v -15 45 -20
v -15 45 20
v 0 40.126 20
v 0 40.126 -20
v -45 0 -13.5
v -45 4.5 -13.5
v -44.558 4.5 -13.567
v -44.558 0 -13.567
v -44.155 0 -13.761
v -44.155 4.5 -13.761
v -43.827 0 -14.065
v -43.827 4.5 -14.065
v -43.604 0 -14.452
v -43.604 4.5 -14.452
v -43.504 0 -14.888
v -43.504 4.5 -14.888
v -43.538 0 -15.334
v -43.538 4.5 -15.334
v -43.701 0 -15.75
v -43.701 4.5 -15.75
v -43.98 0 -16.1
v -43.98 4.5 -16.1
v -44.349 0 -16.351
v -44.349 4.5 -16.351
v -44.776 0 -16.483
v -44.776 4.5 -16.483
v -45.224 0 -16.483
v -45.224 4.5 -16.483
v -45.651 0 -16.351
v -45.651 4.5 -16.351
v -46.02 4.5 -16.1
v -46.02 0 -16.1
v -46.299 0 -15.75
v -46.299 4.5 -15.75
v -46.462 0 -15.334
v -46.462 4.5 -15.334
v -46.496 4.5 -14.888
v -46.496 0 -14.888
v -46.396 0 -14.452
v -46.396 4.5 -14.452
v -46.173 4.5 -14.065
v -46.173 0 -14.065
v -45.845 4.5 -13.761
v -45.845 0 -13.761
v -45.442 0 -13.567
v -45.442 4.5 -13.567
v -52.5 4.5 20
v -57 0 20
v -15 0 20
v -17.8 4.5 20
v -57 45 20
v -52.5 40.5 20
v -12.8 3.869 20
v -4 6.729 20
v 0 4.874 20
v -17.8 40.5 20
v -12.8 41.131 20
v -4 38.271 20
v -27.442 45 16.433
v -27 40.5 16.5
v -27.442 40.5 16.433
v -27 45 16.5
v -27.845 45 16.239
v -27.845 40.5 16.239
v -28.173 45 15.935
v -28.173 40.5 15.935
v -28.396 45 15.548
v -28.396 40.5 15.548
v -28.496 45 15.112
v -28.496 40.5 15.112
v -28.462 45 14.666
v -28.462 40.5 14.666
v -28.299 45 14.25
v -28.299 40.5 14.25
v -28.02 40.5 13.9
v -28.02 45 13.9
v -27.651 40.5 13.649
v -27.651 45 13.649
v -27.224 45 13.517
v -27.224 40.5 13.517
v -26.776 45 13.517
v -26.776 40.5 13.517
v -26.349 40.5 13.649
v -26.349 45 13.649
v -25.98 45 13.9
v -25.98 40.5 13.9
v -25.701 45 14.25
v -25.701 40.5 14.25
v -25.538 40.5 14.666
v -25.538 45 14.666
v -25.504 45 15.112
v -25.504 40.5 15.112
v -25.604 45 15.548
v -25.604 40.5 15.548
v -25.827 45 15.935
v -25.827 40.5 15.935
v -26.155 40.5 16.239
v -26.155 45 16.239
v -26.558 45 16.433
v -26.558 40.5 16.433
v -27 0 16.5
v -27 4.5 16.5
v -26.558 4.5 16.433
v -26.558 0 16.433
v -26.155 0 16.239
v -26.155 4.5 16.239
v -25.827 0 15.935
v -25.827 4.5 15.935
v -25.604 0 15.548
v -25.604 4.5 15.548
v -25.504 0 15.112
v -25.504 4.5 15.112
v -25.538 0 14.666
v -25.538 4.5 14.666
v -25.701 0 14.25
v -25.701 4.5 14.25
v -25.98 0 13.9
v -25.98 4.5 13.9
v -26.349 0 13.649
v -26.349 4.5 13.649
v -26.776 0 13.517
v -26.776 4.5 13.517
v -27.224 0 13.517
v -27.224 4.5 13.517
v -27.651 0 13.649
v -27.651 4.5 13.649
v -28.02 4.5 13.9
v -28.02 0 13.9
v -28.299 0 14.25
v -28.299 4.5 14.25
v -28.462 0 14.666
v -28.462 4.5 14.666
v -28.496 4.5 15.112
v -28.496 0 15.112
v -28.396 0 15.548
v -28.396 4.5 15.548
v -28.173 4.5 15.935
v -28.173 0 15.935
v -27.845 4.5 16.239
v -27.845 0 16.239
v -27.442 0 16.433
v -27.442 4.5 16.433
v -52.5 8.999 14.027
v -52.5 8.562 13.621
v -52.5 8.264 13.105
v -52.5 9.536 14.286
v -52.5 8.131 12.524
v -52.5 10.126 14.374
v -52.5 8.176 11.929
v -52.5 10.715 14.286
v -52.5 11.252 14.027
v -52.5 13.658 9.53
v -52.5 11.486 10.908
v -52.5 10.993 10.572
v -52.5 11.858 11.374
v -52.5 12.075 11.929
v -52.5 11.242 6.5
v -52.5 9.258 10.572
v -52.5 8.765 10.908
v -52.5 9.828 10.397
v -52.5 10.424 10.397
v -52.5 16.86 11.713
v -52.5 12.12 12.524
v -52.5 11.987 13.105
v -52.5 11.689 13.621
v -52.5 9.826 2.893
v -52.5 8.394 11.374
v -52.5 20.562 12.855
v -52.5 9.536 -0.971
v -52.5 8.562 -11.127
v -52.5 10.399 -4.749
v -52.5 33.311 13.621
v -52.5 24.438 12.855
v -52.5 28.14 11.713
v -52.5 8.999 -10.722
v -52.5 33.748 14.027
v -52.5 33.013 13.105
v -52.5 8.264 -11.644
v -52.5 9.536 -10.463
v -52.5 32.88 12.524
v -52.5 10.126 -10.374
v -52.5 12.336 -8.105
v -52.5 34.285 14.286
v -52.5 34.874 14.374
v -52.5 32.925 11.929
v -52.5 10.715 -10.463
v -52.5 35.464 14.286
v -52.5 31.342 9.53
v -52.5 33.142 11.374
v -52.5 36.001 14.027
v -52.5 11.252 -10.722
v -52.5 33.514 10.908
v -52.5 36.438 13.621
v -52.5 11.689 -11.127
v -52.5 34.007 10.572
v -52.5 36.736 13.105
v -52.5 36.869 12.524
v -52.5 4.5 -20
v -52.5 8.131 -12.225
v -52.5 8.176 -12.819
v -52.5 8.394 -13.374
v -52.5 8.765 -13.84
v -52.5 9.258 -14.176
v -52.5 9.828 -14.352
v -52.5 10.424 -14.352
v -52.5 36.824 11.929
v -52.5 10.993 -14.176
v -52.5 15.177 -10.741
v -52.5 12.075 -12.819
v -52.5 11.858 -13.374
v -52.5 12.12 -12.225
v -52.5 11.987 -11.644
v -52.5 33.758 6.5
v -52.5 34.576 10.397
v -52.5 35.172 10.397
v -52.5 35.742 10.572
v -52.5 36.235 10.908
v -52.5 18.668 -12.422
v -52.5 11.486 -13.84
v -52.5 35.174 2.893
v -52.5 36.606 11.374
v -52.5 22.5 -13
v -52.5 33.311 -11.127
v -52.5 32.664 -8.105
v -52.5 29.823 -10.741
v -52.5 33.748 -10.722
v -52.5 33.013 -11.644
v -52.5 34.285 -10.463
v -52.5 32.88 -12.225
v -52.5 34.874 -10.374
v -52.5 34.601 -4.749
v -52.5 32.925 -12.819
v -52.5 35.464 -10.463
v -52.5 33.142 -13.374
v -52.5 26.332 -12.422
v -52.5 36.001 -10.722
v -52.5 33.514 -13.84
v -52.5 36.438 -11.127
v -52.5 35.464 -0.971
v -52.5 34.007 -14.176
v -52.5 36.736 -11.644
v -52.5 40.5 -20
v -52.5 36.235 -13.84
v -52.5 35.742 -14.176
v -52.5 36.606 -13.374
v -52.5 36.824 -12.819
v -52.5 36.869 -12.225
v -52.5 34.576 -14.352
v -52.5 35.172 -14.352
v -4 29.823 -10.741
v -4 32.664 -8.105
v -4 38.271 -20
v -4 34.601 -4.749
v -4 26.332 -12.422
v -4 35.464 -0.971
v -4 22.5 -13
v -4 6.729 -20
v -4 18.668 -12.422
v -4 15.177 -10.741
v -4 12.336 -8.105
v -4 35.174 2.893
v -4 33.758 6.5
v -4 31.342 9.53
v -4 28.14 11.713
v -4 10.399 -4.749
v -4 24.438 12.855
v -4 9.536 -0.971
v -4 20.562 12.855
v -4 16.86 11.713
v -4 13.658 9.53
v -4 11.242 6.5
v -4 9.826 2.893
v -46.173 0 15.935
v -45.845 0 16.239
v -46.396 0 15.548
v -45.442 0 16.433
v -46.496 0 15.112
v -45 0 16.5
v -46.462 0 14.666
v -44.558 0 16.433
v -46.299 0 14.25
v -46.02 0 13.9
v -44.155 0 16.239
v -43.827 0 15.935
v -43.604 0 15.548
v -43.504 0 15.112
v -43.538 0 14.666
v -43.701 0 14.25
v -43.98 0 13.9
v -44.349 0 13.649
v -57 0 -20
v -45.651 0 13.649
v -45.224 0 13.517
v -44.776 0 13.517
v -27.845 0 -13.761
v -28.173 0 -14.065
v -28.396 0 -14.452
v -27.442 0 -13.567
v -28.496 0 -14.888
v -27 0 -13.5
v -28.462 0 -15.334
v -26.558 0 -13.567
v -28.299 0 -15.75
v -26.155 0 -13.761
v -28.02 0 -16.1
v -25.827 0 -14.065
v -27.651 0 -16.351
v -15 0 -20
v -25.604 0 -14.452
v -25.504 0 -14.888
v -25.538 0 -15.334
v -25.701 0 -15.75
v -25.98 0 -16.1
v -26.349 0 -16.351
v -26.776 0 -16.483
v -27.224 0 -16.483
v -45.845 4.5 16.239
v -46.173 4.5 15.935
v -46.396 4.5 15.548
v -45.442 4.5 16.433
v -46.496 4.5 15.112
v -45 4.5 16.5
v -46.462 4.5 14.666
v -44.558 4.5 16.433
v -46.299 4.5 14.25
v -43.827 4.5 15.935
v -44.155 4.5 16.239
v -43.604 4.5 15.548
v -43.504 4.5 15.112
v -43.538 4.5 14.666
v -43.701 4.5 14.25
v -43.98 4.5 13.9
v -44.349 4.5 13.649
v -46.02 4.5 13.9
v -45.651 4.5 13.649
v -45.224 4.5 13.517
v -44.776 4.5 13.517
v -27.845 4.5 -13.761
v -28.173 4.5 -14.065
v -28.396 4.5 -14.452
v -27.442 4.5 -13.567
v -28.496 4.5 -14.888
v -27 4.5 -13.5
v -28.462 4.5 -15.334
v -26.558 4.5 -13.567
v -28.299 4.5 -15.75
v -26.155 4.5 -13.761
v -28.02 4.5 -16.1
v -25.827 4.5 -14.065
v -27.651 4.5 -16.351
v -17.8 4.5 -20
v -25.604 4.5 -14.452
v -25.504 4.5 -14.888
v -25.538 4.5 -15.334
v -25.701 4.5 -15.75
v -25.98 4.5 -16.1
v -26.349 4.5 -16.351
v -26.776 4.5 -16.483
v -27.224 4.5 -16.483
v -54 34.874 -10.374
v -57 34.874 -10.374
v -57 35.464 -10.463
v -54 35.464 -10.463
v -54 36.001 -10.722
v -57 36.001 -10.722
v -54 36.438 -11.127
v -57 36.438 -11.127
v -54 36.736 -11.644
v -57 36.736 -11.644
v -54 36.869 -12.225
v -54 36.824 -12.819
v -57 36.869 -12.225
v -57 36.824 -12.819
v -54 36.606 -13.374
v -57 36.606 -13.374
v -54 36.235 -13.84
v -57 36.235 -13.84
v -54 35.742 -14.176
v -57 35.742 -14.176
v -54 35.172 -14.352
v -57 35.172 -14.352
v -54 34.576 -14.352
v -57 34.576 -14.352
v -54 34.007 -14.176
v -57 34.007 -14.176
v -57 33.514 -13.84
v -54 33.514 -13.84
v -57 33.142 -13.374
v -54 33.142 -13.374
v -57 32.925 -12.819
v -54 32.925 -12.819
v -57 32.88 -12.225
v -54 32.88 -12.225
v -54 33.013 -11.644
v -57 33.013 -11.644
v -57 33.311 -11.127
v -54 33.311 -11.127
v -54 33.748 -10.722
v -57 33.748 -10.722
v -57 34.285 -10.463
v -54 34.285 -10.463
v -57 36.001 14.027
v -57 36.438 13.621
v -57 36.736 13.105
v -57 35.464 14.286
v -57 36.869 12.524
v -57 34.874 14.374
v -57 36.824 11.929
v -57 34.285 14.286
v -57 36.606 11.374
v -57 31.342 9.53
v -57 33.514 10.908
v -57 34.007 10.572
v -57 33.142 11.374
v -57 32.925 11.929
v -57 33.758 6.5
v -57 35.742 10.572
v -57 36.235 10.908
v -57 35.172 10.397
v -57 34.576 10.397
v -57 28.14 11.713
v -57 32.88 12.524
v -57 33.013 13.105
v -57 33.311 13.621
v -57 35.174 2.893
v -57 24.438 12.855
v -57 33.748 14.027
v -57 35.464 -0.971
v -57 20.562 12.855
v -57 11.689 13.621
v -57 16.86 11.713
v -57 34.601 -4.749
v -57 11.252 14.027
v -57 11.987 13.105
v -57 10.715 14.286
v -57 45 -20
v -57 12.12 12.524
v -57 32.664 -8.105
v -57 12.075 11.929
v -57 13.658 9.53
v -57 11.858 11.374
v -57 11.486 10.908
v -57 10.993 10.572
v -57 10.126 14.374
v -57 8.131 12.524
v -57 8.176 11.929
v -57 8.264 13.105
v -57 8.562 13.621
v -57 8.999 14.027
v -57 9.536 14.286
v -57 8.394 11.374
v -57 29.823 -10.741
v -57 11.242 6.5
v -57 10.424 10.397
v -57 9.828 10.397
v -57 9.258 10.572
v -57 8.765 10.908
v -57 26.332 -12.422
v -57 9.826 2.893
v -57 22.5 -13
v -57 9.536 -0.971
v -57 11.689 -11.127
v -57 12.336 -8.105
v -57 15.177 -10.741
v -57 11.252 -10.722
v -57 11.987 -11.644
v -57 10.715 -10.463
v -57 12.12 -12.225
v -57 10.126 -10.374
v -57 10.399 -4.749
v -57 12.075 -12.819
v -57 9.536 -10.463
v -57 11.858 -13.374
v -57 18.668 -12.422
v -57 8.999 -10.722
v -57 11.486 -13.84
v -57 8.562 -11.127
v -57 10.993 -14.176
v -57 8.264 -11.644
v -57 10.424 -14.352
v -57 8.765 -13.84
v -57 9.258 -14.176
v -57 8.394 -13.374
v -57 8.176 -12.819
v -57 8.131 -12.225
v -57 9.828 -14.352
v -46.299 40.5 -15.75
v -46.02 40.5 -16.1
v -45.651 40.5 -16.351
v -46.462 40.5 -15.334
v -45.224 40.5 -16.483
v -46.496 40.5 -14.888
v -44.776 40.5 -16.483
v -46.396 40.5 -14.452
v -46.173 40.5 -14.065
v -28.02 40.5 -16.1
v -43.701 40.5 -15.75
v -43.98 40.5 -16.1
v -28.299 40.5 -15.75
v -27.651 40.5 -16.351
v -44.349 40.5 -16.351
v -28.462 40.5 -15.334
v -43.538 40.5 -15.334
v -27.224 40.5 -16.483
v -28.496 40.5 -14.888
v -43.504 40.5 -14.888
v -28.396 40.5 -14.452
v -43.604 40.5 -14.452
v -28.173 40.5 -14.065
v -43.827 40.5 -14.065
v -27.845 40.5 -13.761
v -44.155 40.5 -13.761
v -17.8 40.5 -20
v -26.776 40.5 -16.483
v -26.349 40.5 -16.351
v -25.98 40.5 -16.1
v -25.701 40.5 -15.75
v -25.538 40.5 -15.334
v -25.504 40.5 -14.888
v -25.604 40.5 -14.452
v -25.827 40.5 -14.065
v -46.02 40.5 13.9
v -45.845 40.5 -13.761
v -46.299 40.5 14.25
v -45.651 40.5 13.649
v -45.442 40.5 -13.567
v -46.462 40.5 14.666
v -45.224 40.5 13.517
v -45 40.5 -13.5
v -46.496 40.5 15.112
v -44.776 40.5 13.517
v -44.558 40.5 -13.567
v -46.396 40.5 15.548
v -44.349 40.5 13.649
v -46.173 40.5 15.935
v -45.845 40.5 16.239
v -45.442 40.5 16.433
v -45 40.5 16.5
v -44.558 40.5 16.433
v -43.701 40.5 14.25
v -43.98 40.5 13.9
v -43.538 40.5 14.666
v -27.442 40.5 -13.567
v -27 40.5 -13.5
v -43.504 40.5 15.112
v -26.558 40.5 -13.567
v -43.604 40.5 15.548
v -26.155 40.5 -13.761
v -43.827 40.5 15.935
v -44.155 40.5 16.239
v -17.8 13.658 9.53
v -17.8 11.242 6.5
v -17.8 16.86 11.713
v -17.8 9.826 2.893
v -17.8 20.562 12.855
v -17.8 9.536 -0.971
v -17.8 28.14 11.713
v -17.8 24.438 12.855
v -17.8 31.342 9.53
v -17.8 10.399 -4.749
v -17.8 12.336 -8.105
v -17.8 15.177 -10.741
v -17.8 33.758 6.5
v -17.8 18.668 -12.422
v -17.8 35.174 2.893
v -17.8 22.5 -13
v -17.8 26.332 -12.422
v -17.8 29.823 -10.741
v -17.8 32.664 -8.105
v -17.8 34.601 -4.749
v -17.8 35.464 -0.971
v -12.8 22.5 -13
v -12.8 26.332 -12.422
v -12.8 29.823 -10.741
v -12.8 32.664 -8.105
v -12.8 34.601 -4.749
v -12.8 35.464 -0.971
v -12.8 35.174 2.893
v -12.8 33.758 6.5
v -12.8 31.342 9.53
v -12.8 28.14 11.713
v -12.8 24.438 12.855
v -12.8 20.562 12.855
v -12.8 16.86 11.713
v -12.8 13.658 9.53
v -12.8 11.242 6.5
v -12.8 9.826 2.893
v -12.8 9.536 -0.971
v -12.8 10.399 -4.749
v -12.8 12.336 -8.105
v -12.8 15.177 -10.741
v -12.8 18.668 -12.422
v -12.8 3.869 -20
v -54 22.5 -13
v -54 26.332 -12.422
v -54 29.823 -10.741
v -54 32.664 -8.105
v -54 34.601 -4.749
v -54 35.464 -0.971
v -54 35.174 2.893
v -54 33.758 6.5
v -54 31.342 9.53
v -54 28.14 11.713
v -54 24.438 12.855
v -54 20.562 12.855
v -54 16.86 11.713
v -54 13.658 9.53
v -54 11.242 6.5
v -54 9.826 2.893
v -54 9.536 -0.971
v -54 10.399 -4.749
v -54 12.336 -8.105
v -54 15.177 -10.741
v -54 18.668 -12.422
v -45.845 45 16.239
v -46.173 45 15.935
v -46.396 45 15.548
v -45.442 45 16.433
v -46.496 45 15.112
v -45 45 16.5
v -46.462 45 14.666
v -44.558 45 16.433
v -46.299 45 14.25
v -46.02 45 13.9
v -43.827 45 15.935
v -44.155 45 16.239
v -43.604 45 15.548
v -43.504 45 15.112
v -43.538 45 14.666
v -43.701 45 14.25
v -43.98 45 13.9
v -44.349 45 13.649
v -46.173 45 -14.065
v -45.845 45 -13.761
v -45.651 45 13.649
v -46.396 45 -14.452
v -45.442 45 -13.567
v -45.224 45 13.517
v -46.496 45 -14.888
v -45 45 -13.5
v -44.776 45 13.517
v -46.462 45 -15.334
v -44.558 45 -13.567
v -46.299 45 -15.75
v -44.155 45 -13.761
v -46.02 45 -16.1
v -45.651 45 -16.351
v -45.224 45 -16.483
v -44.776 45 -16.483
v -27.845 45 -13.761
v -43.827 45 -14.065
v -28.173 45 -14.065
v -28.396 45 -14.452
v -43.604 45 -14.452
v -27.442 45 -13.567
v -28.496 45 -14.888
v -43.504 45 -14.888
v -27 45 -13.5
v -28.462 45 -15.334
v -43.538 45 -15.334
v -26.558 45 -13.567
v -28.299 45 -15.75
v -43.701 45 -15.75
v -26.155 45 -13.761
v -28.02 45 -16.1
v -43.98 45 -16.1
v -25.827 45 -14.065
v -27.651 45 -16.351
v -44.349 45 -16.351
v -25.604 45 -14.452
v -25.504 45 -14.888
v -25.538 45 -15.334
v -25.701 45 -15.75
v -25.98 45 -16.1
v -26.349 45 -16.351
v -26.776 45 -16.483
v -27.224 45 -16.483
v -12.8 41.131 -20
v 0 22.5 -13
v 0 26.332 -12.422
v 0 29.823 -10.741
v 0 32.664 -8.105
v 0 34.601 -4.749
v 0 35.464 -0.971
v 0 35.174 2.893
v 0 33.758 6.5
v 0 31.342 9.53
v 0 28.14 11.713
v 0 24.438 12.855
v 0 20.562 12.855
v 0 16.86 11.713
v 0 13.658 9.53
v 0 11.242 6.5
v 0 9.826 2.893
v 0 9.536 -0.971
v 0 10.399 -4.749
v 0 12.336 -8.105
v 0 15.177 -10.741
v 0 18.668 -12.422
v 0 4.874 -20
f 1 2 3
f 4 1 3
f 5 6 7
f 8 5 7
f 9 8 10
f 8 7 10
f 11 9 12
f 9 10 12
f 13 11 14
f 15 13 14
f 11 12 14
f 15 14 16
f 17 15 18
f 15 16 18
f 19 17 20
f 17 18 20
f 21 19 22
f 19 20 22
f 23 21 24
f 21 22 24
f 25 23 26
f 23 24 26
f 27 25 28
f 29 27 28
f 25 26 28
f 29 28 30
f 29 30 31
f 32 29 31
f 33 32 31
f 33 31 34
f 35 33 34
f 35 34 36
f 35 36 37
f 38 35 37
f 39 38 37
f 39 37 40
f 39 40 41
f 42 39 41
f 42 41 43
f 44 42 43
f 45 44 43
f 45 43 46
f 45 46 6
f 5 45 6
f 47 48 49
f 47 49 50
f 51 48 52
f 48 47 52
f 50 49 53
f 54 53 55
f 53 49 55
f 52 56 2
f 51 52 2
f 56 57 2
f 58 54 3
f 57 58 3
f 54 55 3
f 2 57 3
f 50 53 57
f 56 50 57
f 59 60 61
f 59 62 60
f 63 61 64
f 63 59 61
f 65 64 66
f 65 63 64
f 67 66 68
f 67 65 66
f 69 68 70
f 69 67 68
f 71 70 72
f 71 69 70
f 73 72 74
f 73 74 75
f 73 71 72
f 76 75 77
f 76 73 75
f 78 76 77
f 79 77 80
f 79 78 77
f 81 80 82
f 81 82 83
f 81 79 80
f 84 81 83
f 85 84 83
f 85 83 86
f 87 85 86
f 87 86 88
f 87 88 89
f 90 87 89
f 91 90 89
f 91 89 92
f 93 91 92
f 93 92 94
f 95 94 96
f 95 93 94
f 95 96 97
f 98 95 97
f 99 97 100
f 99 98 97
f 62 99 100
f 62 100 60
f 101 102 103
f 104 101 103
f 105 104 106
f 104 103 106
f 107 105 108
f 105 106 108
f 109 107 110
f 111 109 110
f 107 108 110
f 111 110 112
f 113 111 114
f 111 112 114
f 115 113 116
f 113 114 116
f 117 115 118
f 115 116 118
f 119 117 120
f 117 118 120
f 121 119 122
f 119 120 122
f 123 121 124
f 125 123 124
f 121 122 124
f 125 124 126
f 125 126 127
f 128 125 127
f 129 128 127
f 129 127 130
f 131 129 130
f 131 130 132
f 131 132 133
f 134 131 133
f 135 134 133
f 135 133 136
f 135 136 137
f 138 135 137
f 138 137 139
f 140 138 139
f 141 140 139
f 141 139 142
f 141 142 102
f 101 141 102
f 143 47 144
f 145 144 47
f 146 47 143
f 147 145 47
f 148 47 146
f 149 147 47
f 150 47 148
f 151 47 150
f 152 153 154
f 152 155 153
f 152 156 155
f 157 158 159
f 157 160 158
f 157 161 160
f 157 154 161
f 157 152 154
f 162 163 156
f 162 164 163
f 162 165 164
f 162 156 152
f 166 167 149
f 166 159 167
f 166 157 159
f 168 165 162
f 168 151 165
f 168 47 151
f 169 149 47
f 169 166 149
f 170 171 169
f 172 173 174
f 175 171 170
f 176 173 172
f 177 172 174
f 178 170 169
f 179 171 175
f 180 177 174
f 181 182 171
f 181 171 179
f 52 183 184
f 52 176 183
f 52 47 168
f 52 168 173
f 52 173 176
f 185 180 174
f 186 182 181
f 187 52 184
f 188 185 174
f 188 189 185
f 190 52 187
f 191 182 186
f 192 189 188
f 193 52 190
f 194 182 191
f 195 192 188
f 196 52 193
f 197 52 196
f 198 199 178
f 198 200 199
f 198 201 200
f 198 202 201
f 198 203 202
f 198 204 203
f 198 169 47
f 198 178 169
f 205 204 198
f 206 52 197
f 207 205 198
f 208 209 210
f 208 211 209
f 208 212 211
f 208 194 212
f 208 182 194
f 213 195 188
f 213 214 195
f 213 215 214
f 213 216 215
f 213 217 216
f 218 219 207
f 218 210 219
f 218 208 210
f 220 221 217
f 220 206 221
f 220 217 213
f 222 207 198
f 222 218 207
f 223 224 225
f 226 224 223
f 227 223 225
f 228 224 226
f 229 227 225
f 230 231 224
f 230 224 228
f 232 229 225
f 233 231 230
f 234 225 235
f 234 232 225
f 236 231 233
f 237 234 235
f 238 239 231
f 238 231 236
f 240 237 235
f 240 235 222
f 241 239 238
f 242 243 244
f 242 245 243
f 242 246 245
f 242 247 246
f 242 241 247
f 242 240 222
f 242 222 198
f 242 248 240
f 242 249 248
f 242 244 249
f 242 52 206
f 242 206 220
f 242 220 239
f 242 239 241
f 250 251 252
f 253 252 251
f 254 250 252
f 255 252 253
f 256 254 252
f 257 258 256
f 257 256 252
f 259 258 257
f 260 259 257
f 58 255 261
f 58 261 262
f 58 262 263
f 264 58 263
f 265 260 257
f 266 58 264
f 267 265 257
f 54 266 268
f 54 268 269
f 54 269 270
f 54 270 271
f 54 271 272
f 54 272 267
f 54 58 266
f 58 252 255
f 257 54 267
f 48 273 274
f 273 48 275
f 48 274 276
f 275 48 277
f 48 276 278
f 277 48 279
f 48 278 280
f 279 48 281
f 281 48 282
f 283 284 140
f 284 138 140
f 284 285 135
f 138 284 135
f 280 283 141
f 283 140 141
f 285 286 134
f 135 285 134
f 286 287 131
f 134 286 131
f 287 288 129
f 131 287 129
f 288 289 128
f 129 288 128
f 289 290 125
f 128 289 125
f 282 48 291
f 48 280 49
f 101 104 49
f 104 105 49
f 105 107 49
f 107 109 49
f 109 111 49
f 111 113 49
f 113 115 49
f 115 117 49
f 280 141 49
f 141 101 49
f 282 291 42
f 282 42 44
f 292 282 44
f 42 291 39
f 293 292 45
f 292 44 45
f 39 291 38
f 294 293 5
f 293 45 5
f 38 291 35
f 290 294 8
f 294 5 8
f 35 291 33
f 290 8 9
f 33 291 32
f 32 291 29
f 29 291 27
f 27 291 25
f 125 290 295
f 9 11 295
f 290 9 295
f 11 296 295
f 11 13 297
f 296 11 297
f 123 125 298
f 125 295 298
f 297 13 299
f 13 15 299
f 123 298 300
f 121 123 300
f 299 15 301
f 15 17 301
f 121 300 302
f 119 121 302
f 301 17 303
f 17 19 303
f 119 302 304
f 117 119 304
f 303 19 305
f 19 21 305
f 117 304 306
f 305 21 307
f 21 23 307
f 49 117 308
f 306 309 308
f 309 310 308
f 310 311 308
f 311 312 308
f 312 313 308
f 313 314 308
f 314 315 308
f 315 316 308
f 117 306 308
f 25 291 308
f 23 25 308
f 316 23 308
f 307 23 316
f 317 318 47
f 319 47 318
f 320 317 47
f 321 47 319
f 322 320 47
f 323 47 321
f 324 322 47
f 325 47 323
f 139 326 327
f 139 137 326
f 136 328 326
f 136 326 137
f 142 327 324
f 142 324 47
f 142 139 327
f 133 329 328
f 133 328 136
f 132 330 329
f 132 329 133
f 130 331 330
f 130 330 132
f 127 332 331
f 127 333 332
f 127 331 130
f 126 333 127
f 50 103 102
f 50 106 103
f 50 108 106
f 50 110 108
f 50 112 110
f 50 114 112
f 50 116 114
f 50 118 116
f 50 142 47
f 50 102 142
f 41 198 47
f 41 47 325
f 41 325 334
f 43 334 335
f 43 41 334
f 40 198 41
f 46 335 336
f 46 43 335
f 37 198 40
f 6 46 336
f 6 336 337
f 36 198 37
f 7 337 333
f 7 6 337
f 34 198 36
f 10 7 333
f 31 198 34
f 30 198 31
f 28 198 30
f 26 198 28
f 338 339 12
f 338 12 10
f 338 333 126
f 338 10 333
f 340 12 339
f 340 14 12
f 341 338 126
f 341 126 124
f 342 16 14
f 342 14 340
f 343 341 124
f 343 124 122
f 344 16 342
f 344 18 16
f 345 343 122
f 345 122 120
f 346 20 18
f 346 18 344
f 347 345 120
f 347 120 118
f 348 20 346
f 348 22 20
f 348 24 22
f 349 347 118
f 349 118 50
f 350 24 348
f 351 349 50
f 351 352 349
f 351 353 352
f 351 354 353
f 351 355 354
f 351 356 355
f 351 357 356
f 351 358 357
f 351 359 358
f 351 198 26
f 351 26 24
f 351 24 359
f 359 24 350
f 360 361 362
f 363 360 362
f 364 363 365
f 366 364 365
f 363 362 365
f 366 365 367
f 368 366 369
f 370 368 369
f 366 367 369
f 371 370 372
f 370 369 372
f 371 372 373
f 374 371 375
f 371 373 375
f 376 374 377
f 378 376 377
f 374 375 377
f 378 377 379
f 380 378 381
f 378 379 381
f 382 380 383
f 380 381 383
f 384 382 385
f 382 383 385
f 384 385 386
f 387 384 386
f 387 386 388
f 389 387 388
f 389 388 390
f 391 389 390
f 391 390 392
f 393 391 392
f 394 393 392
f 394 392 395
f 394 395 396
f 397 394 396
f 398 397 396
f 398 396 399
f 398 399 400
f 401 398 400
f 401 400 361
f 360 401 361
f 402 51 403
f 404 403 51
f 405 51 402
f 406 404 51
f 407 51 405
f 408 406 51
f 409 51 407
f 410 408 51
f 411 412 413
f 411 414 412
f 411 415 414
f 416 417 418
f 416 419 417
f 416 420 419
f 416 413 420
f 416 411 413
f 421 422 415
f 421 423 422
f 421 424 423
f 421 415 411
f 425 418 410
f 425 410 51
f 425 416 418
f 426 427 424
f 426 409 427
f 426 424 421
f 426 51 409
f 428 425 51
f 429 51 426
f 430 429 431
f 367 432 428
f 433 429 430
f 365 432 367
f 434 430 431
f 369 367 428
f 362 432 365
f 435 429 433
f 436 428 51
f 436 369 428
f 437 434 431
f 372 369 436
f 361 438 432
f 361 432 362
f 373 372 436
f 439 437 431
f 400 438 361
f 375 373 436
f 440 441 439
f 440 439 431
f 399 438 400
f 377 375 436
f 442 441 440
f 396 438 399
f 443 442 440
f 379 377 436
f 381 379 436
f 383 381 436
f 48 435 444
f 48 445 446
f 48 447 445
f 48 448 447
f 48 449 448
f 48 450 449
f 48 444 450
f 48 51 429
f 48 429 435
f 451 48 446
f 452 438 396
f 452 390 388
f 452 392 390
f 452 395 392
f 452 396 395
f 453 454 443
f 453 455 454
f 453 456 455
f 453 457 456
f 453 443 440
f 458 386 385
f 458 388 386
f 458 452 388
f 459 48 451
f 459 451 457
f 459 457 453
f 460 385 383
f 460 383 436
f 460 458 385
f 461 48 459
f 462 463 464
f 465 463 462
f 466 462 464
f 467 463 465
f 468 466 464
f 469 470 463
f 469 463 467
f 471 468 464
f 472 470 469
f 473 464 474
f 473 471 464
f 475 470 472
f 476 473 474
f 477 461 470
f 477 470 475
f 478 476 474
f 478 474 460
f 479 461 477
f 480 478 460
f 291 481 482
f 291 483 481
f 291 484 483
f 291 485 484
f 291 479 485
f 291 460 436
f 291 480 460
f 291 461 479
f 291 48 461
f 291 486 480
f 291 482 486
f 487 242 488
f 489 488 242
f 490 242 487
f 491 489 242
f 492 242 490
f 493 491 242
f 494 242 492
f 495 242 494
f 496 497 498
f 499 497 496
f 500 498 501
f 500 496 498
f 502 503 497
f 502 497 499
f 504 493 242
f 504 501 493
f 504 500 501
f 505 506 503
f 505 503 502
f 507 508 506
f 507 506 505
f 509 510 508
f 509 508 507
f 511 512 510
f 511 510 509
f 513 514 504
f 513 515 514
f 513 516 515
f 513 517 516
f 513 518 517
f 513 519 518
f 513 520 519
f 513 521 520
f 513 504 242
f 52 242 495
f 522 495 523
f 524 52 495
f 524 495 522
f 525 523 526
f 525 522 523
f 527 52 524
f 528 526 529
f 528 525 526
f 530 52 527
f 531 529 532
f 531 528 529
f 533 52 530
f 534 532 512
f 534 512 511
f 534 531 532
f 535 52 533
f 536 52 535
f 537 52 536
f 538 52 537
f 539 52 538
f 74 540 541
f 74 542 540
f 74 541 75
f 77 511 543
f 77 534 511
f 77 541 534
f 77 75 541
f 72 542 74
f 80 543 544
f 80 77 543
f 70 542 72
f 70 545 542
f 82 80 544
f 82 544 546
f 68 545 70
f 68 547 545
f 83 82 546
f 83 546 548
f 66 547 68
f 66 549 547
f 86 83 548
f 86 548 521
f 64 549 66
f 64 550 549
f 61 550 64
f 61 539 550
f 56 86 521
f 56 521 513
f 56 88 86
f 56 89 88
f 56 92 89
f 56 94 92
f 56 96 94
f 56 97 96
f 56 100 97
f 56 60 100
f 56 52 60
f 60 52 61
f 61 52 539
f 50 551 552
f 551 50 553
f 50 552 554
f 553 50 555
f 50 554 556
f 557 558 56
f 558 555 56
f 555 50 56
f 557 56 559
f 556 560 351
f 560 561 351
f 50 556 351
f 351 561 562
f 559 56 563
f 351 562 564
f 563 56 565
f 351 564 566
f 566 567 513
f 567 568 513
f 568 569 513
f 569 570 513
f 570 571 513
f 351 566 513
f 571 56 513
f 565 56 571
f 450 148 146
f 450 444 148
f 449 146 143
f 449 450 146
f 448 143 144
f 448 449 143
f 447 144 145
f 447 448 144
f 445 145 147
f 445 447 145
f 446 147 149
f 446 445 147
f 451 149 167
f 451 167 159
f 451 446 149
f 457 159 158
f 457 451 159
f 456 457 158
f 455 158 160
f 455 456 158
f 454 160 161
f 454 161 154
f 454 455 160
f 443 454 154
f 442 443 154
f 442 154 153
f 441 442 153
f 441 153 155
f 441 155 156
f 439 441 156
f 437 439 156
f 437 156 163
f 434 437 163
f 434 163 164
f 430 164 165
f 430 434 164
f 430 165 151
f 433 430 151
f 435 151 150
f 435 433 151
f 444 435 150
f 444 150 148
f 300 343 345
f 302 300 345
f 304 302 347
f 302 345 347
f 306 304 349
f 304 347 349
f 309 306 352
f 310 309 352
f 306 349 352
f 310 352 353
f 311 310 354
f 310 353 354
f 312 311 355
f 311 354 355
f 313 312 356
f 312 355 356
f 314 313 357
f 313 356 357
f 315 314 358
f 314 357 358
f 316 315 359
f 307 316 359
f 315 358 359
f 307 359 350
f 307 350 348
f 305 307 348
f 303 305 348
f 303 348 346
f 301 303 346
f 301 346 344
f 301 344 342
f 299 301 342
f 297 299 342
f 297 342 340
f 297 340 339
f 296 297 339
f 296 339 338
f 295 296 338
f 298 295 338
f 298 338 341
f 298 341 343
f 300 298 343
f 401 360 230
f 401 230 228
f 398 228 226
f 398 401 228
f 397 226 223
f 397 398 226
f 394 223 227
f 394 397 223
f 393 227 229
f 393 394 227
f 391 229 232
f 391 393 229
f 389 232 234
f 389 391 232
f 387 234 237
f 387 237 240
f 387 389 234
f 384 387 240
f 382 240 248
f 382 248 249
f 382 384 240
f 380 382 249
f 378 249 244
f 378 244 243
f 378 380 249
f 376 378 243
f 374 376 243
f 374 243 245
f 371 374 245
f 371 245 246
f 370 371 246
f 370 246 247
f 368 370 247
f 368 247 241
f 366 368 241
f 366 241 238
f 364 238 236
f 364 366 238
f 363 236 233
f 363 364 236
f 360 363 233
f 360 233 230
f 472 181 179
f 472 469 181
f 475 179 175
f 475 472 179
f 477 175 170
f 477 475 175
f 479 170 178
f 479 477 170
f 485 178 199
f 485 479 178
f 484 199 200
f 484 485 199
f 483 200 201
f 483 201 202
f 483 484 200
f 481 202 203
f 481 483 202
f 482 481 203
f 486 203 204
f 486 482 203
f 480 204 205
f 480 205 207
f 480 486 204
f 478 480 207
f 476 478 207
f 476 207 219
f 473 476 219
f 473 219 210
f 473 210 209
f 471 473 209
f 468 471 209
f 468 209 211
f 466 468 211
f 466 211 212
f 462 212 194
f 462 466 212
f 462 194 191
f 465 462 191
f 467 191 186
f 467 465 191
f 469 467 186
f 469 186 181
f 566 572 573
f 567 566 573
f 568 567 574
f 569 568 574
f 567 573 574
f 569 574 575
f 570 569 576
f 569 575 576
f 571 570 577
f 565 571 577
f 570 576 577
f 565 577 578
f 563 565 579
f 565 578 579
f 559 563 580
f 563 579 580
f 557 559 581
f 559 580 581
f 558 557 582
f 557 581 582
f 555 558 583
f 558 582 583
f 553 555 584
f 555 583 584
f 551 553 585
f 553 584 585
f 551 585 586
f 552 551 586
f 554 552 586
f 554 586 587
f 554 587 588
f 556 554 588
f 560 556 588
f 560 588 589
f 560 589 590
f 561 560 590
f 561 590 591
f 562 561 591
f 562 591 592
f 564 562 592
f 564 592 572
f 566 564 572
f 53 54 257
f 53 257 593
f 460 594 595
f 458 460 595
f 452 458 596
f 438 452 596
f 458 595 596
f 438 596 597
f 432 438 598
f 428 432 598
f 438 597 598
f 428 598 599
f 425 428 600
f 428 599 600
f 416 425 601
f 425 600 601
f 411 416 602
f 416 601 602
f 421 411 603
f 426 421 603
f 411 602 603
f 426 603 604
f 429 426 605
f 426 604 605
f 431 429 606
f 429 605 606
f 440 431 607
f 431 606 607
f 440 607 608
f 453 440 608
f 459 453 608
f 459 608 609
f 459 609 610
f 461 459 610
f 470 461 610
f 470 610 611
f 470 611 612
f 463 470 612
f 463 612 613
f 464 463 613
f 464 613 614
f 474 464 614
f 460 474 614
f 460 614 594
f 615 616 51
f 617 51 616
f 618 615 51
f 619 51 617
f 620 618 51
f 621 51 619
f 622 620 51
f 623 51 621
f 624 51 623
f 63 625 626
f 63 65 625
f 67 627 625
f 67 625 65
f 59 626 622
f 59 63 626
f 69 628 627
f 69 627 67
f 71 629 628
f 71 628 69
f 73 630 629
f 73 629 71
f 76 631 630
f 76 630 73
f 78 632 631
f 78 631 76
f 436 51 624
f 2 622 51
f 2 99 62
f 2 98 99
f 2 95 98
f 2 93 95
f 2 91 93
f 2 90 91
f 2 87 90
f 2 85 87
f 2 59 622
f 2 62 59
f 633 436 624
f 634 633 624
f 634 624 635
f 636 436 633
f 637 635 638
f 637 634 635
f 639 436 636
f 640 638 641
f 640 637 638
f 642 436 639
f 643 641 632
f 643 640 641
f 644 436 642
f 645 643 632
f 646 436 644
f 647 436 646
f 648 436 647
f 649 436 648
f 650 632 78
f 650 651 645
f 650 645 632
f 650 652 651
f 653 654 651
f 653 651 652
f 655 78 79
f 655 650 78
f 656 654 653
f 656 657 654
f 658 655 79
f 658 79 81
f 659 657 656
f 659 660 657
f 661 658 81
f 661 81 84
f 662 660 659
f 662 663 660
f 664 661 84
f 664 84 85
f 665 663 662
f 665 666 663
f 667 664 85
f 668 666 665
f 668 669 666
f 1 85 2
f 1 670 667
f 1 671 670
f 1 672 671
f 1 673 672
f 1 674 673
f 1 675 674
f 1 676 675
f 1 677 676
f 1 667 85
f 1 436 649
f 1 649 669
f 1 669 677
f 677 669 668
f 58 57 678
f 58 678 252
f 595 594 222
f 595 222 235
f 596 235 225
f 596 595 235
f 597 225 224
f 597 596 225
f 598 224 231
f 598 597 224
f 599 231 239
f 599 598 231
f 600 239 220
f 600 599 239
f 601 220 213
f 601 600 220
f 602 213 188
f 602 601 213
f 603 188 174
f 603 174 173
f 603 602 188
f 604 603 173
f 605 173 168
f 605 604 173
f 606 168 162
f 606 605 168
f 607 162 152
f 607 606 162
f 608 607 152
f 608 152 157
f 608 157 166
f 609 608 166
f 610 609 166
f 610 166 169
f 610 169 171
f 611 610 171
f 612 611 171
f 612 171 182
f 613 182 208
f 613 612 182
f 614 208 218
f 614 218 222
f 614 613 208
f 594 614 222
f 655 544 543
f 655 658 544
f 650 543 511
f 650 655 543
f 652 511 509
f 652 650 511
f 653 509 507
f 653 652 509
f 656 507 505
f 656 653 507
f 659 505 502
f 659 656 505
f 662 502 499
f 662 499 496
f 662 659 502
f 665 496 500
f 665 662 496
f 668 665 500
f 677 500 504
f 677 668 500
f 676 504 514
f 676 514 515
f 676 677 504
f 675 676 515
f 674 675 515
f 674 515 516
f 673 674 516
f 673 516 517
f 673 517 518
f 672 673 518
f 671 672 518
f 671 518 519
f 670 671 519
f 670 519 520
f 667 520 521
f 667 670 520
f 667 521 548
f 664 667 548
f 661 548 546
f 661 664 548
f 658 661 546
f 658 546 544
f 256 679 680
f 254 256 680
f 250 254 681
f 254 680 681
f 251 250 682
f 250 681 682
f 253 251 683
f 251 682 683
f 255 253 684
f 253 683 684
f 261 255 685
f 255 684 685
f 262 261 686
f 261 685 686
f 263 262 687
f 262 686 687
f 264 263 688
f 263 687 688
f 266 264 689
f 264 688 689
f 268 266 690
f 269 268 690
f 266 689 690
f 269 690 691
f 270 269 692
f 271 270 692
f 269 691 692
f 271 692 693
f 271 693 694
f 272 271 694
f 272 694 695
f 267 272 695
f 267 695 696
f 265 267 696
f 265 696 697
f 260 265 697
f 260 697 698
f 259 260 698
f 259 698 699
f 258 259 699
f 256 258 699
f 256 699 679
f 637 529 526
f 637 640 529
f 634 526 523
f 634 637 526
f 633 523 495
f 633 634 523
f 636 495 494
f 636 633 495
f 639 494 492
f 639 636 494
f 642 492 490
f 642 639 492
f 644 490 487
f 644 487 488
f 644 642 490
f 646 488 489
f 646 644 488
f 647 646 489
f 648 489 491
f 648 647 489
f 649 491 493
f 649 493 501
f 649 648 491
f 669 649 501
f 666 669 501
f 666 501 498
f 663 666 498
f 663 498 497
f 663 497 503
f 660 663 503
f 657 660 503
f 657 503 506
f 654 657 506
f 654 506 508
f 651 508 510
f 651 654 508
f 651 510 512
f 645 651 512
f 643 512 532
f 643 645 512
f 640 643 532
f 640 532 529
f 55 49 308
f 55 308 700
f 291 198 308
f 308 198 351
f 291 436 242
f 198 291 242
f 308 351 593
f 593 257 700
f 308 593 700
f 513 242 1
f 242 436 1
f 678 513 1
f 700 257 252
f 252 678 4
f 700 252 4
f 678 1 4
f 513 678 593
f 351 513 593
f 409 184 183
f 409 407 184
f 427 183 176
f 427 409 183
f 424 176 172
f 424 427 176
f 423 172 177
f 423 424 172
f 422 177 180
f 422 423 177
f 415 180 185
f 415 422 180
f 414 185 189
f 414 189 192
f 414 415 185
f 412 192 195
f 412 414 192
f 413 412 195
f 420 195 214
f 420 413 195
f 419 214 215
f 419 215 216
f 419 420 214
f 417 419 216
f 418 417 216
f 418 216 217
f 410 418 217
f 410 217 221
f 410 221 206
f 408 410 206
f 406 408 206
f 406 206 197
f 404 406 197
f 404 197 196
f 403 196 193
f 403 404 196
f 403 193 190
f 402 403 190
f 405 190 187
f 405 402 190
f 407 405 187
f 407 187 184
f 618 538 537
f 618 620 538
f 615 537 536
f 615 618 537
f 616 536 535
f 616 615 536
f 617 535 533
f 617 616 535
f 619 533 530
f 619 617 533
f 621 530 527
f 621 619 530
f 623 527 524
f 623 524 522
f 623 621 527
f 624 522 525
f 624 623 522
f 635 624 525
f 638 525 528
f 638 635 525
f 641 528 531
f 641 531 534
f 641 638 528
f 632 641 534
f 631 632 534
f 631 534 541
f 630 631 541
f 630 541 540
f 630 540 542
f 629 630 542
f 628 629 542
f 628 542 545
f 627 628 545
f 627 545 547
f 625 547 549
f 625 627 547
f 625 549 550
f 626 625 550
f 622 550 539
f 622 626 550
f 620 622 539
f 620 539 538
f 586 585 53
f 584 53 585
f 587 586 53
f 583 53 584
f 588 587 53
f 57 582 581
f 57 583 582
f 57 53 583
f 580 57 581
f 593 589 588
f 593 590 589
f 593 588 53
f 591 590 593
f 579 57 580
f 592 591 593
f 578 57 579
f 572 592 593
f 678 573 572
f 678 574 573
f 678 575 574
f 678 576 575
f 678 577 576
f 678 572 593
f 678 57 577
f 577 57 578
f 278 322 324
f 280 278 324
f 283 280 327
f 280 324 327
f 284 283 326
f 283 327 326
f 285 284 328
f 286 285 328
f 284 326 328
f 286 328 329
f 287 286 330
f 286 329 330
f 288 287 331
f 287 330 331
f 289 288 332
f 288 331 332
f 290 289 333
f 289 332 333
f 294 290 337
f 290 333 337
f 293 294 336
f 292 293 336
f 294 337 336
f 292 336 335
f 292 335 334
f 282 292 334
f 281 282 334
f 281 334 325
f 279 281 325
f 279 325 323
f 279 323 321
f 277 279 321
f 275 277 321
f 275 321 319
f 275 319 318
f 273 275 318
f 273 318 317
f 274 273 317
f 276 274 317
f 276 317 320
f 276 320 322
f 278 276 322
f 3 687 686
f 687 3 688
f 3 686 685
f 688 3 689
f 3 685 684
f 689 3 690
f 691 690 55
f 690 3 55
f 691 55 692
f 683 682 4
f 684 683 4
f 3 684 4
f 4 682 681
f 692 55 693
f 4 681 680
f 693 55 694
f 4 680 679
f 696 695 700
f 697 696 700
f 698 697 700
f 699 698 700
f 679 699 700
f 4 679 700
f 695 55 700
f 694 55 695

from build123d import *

# Parameters (mm, degrees)
SKETCH_1_W          = 57
SKETCH_1_H          = 40
EXTRUDE_1_DEPTH     = 45
SKETCH_5_R          = 13
CUT_EXTRUDE_1_DEPTH = 17.8
CUT_EXTRUDE_2_DEPTH = 36.2
SKETCH_7_R          = 13
CUT_EXTRUDE_3_DEPTH = 31.1
CUT_EXTRUDE_5_DEPTH = 83.909589313
SKETCH_12_R         = 2
CUT_EXTRUDE_6_DEPTH = 8
SKETCH_13_R         = 1.5
CUT_EXTRUDE_7_DEPTH = 76.325958341
CUT_EXTRUDE_9_DEPTH = 94
SKETCH_16_W         = 40
SKETCH_16_H         = 39
SKETCH_16_R         = 2
SKETCH_16_R_2       = 13
EXTRUDE_2_DEPTH     = 1.5
EXTRUDE_START       = 1.5
SKETCH_17_W         = 34.7
SKETCH_17_H         = 40
SKETCH_17_R         = 1.5
EXTRUDE_3_DEPTH     = 1.5
SKETCH_18_W         = 34.7
SKETCH_18_H         = 40
SKETCH_18_R         = 1.5
EXTRUDE_4_DEPTH     = 1.5
EXTRUDE_START_2     = 1
SKETCH_20_W         = 40
SKETCH_20_H         = 37.911419384
SKETCH_20_R         = 13
EXTRUDE_6_DEPTH     = 1


with BuildPart() as part:
    # 草图1 → 凸台-拉伸1 (new body)
    with BuildSketch(Plane(origin=(0, 0, 0), x_dir=(1, 0, 0), z_dir=(0, 1, 0))):
        with Locations((-28.5, 0)):
            Rectangle(SKETCH_1_W, SKETCH_1_H)
    extrude(amount=EXTRUDE_1_DEPTH)

    # 草图5 → 切除-拉伸1 (cut)
    with BuildSketch(Plane(origin=(0, 0, 0), x_dir=(0, 0, -1), z_dir=(1, 0, 0))):
        with Locations((0, 22.5)):
            Circle(SKETCH_5_R)
    extrude(amount=-CUT_EXTRUDE_1_DEPTH, mode=Mode.SUBTRACT)

    # 草图6 → 切除-拉伸2 (cut)
    with BuildSketch(Plane(origin=(-17.8, 0, 0), x_dir=(0, 0, -1), z_dir=(1, 0, 0))):
        Polygon((-22, 25), (-22, 3), (22, 3), (22, 25), (22, 42), (-22, 42), align=None)
    extrude(amount=-CUT_EXTRUDE_2_DEPTH, mode=Mode.SUBTRACT)

    # 草图7 → 切除-拉伸3 (cut)
    with BuildSketch(Plane(origin=(-54, 0, 0), x_dir=(0, 0, -1), z_dir=(1, 0, 0))):
        with Locations((0, 22.5)):
            Circle(SKETCH_7_R)
    extrude(amount=-CUT_EXTRUDE_3_DEPTH, mode=Mode.SUBTRACT)

    # 草图10 → 切除-拉伸5 (cut, through all)
    with BuildSketch(Plane.XY.offset(20)):
        Polygon((-15, 45), (0, 40.126204557), (0, 45), align=None)
        Polygon((0, 0), (-15, 0), (0, 4.873795443), align=None)
    extrude(amount=-CUT_EXTRUDE_5_DEPTH, mode=Mode.SUBTRACT)

    # 草图12 → 切除-拉伸6 (cut)
    with BuildSketch(Plane.ZY.offset(57)):
        with Locations((-12.374368671, 34.874368671)):
            Circle(SKETCH_12_R)
        with Locations((12.374368671, 34.874368671)):
            Circle(SKETCH_12_R)
        with Locations((12.374368671, 10.125631329)):
            Circle(SKETCH_12_R)
        with Locations((-12.374368671, 10.125631329)):
            Circle(SKETCH_12_R)
    extrude(amount=-CUT_EXTRUDE_6_DEPTH, mode=Mode.SUBTRACT)

    # 草图13 → 切除-拉伸7 (cut, through all)
    with BuildSketch(Plane(origin=(0, 45, 0), x_dir=(1, 0, 0), z_dir=(0, 1, 0))):
        with Locations(Location((-45, 15, 0), (0, 0, 270))):
            Circle(SKETCH_13_R)
        with Locations(Location((-27, 15, 0), (0, 0, 270))):
            Circle(SKETCH_13_R)
        with Locations(Location((-27, -15, 0), (0, 0, 270))):
            Circle(SKETCH_13_R)
        with Locations(Location((-45, -15, 0), (0, 0, 270))):
            Circle(SKETCH_13_R)
    extrude(amount=-CUT_EXTRUDE_7_DEPTH, mode=Mode.SUBTRACT)

    # 草图15 → 切除-拉伸9 (cut)
    with BuildSketch(Plane.XY.offset(20)):
        Polygon((-13.8, 41.455709692), (-4, 38.271496669), (-4, 6.728503331), (-13.8, 3.544290308), align=None)
    extrude(amount=-CUT_EXTRUDE_9_DEPTH, mode=Mode.SUBTRACT)

    # 草图16 → 凸台-拉伸2 (add)
    with BuildSketch(Plane(origin=(-54, 0, 0), x_dir=(0, 0, -1), z_dir=(1, 0, 0))):
        with Locations((0, 22.5)):
            Rectangle(SKETCH_16_W, SKETCH_16_H)
        with Locations(Location((-12.374368671, 10.125631329, 0), (0, 0, 180))):
            Circle(SKETCH_16_R, mode=Mode.SUBTRACT)
        with Locations(Location((12.374368671, 10.125631329, 0), (0, 0, 180))):
            Circle(SKETCH_16_R, mode=Mode.SUBTRACT)
        with Locations((0, 22.5)):
            Circle(SKETCH_16_R_2, mode=Mode.SUBTRACT)
        with Locations(Location((12.374368671, 34.874368671, 0), (0, 0, 180))):
            Circle(SKETCH_16_R, mode=Mode.SUBTRACT)
        with Locations(Location((-12.374368671, 34.874368671, 0), (0, 0, 180))):
            Circle(SKETCH_16_R, mode=Mode.SUBTRACT)
    extrude(amount=EXTRUDE_2_DEPTH)

    # 草图17 → 凸台-拉伸3 (add)
    with BuildSketch(Plane(origin=(0, 3, 0), x_dir=(1, 0, 0), z_dir=(0, 1, 0)).offset(EXTRUDE_START)):
        with Locations((-35.15, 0)):
            Rectangle(SKETCH_17_W, SKETCH_17_H)
        with Locations(Location((-45, -15, 0), (0, 0, 270))):
            Circle(SKETCH_17_R, mode=Mode.SUBTRACT)
        with Locations(Location((-27, -15, 0), (0, 0, 270))):
            Circle(SKETCH_17_R, mode=Mode.SUBTRACT)
        with Locations(Location((-27, 15, 0), (0, 0, 270))):
            Circle(SKETCH_17_R, mode=Mode.SUBTRACT)
        with Locations(Location((-45, 15, 0), (0, 0, 270))):
            Circle(SKETCH_17_R, mode=Mode.SUBTRACT)
    extrude(amount=-EXTRUDE_3_DEPTH)

    # 草图18 → 凸台-拉伸4 (add)
    with BuildSketch(Plane.XZ.offset(-42)):
        with Locations((-35.15, 0)):
            Rectangle(SKETCH_18_W, SKETCH_18_H)
        with Locations(Location((-45, -15, 0), (0, 0, 90))):
            Circle(SKETCH_18_R, mode=Mode.SUBTRACT)
        with Locations(Location((-27, -15, 0), (0, 0, 90))):
            Circle(SKETCH_18_R, mode=Mode.SUBTRACT)
        with Locations(Location((-27, 15, 0), (0, 0, 90))):
            Circle(SKETCH_18_R, mode=Mode.SUBTRACT)
        with Locations(Location((-45, 15, 0), (0, 0, 90))):
            Circle(SKETCH_18_R, mode=Mode.SUBTRACT)
    extrude(amount=EXTRUDE_4_DEPTH)

    # 草图20 → 凸台-拉伸6 (add)
    with BuildSketch(Plane(origin=(-13.8, 0, 0), x_dir=(0, 0, -1), z_dir=(1, 0, 0)).offset(EXTRUDE_START_2)):
        with Locations((0, 22.5)):
            Rectangle(SKETCH_20_W, SKETCH_20_H)
        with Locations((0, 22.5)):
            Circle(SKETCH_20_R, mode=Mode.SUBTRACT)
    extrude(amount=-EXTRUDE_6_DEPTH)


solid = part.part
